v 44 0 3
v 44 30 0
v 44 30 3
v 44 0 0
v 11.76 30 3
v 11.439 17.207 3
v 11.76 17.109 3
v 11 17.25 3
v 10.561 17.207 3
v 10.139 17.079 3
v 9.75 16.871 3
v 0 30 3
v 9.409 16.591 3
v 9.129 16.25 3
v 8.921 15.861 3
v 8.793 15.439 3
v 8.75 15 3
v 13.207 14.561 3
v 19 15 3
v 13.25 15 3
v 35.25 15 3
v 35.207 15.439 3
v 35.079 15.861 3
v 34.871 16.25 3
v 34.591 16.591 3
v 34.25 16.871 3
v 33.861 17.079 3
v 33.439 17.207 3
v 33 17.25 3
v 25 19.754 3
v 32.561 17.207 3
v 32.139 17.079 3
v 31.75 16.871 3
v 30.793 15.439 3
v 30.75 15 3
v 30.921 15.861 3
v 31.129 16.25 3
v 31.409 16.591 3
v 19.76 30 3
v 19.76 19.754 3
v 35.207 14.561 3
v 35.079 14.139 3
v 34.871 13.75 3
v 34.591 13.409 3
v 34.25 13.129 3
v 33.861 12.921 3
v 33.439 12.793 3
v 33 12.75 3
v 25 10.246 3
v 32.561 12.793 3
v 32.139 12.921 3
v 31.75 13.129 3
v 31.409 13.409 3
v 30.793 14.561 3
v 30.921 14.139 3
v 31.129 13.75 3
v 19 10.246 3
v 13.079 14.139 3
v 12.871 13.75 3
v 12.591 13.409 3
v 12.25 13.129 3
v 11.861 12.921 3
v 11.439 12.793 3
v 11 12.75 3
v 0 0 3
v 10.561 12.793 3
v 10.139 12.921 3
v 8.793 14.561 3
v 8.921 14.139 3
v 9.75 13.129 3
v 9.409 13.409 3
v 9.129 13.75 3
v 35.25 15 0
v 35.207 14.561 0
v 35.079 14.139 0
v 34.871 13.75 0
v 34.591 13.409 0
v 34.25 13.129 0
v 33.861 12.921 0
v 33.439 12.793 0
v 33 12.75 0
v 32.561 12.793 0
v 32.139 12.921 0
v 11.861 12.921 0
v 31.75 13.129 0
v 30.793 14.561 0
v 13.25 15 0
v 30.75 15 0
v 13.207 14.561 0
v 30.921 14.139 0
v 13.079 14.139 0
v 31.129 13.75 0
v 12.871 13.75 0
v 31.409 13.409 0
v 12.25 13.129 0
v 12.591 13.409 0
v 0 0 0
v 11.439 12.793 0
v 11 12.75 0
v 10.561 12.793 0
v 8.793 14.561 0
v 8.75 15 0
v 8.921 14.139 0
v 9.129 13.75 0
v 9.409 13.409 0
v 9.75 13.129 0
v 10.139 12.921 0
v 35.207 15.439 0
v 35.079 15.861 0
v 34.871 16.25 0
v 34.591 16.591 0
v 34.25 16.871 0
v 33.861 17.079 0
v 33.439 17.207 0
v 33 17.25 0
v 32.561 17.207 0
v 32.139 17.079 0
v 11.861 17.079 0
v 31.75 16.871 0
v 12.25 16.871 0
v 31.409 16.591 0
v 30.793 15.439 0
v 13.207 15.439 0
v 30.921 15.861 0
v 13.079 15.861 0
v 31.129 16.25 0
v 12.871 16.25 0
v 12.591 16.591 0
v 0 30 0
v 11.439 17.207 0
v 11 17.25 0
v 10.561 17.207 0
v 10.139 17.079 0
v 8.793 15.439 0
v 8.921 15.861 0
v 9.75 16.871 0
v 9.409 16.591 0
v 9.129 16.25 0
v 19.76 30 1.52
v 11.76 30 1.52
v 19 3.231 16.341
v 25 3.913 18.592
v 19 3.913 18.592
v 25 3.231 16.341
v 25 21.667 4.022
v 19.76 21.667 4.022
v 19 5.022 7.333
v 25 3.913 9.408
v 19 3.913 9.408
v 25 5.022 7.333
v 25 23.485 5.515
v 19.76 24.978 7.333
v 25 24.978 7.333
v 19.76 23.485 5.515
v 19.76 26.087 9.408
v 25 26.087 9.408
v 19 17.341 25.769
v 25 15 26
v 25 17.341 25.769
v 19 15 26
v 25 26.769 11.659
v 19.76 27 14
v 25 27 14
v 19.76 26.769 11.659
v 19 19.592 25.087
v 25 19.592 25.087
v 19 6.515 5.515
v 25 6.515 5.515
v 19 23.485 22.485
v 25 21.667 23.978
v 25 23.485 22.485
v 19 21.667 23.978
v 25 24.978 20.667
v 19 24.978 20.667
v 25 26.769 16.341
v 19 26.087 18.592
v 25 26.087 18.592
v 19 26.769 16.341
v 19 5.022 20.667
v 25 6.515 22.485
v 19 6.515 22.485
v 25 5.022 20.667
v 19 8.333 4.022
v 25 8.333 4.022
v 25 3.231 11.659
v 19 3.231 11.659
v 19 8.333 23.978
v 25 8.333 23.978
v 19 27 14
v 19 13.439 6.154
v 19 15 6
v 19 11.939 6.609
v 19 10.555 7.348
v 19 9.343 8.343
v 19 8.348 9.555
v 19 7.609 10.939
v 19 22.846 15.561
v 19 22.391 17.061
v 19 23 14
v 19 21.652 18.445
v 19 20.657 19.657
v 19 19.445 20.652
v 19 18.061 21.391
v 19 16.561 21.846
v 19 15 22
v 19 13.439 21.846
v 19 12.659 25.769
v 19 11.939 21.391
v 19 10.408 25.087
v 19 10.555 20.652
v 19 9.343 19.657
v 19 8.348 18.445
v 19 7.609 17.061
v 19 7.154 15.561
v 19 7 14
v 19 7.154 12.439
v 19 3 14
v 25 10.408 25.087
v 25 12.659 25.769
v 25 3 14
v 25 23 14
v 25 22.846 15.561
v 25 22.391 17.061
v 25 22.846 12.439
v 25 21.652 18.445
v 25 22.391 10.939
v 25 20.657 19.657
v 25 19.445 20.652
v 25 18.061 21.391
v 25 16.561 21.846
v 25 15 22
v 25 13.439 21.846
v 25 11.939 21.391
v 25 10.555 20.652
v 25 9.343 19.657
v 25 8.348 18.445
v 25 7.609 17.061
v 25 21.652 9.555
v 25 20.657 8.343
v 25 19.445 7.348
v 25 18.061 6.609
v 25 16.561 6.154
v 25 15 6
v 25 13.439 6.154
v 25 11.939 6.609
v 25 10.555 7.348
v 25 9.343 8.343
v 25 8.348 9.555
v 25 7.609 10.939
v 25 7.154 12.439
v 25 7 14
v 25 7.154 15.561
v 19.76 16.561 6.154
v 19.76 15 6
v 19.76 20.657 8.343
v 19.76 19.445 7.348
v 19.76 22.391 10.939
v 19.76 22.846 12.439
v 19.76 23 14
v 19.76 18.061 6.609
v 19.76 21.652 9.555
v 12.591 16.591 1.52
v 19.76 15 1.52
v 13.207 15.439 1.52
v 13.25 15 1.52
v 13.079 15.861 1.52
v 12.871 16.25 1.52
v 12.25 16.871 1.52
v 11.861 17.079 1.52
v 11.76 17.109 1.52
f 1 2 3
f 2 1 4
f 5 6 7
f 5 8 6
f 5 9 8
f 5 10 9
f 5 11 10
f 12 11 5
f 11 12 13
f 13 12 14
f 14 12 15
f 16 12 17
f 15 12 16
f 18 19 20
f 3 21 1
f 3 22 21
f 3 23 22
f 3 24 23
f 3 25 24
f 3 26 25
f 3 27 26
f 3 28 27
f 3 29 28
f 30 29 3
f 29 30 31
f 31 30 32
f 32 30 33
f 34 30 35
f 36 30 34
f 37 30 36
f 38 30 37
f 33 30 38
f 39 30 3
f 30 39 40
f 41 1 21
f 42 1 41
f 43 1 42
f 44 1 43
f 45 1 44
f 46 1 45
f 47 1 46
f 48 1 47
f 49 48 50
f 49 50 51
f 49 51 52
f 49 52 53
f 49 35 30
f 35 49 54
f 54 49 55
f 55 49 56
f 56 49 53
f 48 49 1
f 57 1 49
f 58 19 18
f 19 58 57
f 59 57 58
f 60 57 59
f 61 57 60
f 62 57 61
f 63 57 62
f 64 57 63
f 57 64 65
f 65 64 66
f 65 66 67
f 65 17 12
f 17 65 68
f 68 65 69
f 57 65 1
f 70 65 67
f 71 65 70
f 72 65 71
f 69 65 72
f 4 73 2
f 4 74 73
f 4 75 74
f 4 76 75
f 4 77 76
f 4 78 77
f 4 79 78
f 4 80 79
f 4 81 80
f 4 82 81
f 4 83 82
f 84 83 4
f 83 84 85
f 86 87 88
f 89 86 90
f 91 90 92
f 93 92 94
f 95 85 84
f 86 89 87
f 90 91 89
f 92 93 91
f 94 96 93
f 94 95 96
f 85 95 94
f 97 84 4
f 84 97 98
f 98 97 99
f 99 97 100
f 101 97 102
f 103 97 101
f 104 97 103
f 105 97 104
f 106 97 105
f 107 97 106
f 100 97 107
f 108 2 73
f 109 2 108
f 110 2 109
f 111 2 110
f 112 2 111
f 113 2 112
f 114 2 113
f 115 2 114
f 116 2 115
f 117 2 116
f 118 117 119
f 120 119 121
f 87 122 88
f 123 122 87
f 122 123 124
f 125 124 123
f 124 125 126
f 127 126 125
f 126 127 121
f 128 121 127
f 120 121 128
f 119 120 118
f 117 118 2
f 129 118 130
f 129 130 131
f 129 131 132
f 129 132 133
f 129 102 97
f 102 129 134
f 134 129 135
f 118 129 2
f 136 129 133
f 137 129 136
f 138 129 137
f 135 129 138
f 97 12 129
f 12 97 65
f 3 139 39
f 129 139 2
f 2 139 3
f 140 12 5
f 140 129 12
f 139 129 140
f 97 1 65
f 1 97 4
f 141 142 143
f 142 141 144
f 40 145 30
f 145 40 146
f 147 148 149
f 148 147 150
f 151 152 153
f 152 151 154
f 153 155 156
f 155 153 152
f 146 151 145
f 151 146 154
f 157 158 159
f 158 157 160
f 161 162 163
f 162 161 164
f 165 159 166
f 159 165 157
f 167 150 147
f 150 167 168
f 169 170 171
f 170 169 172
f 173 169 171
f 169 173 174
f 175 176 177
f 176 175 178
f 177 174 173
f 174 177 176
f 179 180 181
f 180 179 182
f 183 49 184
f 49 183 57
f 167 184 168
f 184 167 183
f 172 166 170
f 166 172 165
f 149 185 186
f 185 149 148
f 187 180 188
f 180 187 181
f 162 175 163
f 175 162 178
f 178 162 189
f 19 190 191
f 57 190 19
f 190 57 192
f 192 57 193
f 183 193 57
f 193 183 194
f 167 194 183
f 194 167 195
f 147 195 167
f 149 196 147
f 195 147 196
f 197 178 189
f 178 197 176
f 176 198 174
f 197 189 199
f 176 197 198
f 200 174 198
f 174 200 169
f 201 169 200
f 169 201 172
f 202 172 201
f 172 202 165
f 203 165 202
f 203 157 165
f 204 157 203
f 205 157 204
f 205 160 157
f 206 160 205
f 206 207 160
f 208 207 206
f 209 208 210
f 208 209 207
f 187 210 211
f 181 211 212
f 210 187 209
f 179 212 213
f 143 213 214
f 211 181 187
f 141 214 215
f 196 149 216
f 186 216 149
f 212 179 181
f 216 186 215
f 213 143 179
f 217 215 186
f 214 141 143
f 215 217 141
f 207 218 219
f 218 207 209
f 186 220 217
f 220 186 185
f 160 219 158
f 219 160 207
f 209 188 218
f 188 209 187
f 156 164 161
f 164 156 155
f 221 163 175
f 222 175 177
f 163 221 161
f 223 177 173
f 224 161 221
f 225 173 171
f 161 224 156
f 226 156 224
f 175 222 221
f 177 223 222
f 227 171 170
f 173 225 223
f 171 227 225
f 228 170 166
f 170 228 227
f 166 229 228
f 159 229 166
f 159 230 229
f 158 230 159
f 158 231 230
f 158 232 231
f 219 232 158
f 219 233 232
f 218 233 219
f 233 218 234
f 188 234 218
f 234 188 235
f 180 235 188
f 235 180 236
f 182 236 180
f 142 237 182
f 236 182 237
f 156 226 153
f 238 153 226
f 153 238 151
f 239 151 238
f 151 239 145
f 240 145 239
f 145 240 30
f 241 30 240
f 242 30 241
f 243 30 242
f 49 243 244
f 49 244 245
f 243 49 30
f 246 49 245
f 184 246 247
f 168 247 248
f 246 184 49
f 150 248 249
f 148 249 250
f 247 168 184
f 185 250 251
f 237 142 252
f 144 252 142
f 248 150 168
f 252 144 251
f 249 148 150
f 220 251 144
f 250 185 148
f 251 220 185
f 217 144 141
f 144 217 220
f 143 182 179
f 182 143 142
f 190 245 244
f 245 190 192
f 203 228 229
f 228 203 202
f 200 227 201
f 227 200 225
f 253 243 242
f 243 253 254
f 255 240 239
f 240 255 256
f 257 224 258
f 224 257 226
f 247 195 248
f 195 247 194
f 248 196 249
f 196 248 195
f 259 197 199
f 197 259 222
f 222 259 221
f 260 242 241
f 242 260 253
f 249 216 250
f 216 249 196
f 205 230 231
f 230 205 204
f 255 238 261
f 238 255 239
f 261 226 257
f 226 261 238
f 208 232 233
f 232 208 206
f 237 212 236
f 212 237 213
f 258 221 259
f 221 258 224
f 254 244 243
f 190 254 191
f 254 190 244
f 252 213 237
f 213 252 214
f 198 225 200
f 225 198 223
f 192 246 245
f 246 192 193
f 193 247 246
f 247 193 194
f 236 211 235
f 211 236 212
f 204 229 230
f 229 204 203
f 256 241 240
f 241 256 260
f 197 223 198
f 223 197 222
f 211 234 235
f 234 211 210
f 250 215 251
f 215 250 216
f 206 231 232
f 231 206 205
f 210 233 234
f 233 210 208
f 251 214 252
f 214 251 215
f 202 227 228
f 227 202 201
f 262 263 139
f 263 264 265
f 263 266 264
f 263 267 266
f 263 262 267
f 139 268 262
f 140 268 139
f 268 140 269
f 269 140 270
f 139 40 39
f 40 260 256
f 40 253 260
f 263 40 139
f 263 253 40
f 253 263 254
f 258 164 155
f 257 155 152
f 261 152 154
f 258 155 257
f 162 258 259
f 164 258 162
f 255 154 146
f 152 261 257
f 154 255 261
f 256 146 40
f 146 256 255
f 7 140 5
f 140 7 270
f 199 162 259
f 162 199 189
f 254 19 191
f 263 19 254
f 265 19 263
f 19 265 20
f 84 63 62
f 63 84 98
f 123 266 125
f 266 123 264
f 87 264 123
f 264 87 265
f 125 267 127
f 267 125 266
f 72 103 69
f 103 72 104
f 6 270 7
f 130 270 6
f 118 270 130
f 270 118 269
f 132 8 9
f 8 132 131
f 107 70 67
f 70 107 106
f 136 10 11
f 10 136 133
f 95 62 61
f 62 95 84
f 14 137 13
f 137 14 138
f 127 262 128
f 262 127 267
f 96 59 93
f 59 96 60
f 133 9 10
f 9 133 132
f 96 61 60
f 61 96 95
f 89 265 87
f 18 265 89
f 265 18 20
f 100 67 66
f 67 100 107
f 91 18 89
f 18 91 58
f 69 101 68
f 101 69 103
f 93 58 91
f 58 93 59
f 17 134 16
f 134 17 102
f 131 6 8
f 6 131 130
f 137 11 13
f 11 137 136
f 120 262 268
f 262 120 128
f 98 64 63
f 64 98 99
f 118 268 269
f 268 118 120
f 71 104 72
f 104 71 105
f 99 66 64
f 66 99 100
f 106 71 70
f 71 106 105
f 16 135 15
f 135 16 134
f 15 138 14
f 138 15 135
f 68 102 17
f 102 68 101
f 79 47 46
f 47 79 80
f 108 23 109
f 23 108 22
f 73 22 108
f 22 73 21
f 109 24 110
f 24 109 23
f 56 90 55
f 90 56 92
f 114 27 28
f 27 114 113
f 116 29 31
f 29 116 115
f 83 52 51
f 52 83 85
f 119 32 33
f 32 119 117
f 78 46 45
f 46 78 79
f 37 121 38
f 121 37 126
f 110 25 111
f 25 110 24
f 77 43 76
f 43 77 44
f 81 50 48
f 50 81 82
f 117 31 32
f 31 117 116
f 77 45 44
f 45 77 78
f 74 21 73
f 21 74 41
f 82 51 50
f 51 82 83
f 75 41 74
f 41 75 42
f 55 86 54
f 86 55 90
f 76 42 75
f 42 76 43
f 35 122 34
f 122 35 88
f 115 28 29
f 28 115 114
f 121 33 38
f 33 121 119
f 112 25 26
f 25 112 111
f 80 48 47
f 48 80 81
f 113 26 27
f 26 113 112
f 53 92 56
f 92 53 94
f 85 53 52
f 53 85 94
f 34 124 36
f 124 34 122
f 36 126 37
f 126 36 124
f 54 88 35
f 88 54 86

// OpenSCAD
$fn = 32;

// ----------------------------------------------------------------------
// Cable clip: cable 16 mm, clamp 24 mm, base 44 mm
// ----------------------------------------------------------------------

// --- parameters (mm) ---
foot_w = 44;              // base length, X
foot_d = 30;              // base width, Y
foot_t = 3;               // base thickness
hose_seat_d = 24;         // clamp outside diameter
ring_t = 4;               // clamp wall
cable_d = 16;             // cable opening
ring_w = 6;               // clamp width along the cable
screw_d = 4.5;            // screw clearance
throat = 12.48;           // snap throat width
sink = 1;                 // overlap of the clamp into the base

module base() {
  cube([foot_w, foot_d, foot_t]);
}

module clamp() {
  translate([foot_w / 2, foot_d / 2, foot_t + hose_seat_d / 2 - sink]) rotate([0, 90, 0])
    cylinder(h = ring_w, d = hose_seat_d, center = true);
}

difference() {
  union() {
    base();
    clamp();
  }
  translate([foot_w / 2, foot_d / 2, foot_t + hose_seat_d / 2 - sink]) rotate([0, 90, 0]) translate([0, 0, -ring_w / 2 - 1]) cylinder(h = ring_w + 2, d = cable_d);
  /* snap throat: the opening is narrower than the cable */
  translate([foot_w / 2 - throat / 2, foot_d / 2, foot_t + hose_seat_d / 2 - sink]) rotate([0, 90, 0]) translate([0, 0, -ring_w / 2 - 1]) cube([throat, hose_seat_d + 2, ring_w + 2]);
  translate([11, foot_d / 2, -1]) cylinder(h = foot_t + 2, d = screw_d);
  translate([33, foot_d / 2, -1]) cylinder(h = foot_t + 2, d = screw_d);
}
